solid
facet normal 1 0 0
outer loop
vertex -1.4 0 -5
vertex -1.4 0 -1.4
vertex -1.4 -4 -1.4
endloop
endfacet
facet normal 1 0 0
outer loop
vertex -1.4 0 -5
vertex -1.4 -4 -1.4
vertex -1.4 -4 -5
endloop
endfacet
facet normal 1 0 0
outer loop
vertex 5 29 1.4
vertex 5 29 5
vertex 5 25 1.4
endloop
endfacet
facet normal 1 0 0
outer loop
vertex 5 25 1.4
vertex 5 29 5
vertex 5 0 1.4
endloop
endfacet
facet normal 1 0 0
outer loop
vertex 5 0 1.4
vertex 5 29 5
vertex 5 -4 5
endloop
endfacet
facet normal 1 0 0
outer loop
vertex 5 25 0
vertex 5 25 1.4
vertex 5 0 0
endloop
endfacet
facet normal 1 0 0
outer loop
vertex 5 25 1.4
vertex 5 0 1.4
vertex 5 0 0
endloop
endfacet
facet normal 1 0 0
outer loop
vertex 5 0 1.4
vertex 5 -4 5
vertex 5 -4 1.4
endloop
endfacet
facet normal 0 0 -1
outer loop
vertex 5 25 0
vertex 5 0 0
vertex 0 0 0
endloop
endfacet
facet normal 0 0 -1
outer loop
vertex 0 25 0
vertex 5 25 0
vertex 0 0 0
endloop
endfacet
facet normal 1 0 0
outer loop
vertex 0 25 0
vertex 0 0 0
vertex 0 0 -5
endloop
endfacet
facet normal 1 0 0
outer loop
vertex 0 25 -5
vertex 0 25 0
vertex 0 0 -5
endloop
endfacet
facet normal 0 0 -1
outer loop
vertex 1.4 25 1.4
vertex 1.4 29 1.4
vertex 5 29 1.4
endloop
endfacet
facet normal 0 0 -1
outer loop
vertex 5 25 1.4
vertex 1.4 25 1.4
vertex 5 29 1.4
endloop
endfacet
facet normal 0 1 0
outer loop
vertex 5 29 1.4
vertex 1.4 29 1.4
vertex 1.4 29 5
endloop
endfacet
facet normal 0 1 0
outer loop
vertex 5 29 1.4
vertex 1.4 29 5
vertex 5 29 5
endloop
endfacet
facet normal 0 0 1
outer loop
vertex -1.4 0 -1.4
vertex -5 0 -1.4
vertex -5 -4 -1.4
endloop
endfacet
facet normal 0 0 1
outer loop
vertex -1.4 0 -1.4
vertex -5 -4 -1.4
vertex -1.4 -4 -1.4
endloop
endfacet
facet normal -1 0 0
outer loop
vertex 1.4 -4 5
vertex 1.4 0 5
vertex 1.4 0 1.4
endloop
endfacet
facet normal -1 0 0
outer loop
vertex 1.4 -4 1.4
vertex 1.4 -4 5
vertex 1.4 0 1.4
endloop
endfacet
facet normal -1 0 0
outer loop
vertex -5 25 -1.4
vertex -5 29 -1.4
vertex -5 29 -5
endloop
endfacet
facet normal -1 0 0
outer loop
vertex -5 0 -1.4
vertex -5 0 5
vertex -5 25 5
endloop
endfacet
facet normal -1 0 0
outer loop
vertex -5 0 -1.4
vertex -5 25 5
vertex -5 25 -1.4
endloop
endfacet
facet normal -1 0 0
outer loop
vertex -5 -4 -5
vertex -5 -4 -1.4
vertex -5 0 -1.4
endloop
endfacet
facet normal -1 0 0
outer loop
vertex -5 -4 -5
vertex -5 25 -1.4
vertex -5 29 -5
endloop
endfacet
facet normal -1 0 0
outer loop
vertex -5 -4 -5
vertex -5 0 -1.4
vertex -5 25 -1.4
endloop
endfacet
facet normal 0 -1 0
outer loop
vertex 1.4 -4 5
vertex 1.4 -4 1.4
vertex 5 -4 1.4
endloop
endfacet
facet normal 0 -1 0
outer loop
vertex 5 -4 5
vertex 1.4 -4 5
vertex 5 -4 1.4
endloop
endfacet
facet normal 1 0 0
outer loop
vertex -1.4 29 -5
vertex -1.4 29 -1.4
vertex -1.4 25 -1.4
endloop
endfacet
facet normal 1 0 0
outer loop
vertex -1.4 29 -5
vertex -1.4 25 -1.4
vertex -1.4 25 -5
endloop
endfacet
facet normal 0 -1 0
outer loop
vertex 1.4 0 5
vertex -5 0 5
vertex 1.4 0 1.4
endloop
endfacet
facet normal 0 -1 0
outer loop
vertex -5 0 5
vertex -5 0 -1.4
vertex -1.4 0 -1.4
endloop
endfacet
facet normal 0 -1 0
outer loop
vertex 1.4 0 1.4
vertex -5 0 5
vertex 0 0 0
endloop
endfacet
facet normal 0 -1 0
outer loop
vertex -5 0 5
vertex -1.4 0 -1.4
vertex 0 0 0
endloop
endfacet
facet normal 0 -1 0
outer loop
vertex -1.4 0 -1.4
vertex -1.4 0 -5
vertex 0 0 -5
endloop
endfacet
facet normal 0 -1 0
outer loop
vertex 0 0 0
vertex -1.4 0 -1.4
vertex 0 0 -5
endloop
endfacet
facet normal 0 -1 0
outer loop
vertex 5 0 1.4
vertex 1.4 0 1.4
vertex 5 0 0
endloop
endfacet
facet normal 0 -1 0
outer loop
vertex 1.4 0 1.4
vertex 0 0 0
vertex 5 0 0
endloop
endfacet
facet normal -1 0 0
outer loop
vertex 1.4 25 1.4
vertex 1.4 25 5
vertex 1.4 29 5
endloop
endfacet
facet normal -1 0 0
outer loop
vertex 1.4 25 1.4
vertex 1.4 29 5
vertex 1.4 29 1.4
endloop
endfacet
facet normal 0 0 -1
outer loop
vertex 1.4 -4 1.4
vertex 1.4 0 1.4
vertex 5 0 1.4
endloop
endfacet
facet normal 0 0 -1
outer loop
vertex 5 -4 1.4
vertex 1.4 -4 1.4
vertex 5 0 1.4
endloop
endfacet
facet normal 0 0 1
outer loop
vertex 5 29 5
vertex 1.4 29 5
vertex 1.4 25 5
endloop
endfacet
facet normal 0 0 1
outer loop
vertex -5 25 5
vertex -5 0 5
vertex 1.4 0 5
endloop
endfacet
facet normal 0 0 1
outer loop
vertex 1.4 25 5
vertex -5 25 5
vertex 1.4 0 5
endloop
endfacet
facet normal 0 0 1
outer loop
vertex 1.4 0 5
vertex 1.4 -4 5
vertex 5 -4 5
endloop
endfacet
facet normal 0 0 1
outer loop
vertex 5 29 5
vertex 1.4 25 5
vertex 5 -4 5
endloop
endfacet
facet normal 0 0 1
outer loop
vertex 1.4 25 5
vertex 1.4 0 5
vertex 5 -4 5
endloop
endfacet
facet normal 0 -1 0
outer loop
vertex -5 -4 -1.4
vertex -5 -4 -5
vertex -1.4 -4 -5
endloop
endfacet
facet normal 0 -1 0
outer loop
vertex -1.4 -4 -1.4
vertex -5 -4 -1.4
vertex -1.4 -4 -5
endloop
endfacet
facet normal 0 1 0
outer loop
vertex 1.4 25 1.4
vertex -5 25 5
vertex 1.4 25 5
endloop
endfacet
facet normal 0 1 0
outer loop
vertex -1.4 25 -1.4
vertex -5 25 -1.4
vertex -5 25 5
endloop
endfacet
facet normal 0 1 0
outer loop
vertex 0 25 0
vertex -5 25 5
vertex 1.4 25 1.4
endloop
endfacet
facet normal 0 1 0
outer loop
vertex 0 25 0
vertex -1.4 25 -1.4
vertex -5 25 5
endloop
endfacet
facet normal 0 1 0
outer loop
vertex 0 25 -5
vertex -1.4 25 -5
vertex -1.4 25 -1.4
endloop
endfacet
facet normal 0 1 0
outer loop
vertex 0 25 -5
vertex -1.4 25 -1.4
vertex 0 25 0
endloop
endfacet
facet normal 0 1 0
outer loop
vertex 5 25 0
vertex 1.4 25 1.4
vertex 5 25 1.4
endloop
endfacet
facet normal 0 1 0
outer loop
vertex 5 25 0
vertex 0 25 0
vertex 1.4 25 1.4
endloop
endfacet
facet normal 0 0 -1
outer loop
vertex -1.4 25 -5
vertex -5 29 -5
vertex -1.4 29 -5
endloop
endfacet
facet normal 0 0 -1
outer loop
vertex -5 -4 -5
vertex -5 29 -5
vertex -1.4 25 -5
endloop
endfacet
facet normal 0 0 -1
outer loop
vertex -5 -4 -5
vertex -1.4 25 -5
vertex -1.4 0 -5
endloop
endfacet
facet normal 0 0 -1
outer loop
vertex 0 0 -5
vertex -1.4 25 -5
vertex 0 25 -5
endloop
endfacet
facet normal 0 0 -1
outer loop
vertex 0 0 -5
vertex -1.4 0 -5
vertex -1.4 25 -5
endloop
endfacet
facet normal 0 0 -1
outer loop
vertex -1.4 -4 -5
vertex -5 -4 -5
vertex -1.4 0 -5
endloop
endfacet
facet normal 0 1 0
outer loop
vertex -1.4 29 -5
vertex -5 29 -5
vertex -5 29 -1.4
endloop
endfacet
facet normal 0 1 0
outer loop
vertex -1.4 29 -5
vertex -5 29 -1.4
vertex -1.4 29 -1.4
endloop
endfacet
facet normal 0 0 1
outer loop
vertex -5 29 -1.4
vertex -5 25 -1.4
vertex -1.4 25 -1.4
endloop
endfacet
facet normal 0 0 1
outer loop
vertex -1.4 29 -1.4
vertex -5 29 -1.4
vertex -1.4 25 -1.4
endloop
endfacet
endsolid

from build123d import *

# Parameters (mm, degrees)
BOSS_EXTRUDE2_DEPTH = 25
SKETCH13_W          = 3.6
SKETCH13_H          = 3.6
BOSS_EXTRUDE3_DEPTH = 4
SKETCH15_W          = 3.6
SKETCH15_H          = 3.6
BOSS_EXTRUDE4_DEPTH = 4


with BuildPart() as part:
    # Sketch12 → Boss-Extrude2 (new body)
    with BuildSketch(Plane(origin=(0, 0, 0), x_dir=(1, 0, 0), z_dir=(0, 1, 0))):
        Polygon((-5, -5), (5, -5), (5, 0), (0, 0), (0, 5), (-5, 5), (-5, 0), align=None)
    extrude(amount=BOSS_EXTRUDE2_DEPTH)

    # Sketch13 → Boss-Extrude3 (add)
    with BuildSketch(Plane(origin=(0, 0, 0), x_dir=(1, 0, 0), z_dir=(0, 1, 0))):
        with Locations((-3.2, 3.2)):
            Rectangle(SKETCH13_W, SKETCH13_H)
        with Locations((3.2, -3.2)):
            Rectangle(SKETCH13_W, SKETCH13_H)
    extrude(amount=-BOSS_EXTRUDE3_DEPTH)

    # Sketch15 → Boss-Extrude4 (add)
    with BuildSketch(Plane(origin=(0, 25, 0), x_dir=(1, 0, 0), z_dir=(0, 1, 0))):
        with Locations((-3.2, 3.2)):
            Rectangle(SKETCH15_W, SKETCH15_H)
        with Locations((3.2, -3.2)):
            Rectangle(SKETCH15_W, SKETCH15_H)
    extrude(amount=BOSS_EXTRUDE4_DEPTH)


solid = part.part
